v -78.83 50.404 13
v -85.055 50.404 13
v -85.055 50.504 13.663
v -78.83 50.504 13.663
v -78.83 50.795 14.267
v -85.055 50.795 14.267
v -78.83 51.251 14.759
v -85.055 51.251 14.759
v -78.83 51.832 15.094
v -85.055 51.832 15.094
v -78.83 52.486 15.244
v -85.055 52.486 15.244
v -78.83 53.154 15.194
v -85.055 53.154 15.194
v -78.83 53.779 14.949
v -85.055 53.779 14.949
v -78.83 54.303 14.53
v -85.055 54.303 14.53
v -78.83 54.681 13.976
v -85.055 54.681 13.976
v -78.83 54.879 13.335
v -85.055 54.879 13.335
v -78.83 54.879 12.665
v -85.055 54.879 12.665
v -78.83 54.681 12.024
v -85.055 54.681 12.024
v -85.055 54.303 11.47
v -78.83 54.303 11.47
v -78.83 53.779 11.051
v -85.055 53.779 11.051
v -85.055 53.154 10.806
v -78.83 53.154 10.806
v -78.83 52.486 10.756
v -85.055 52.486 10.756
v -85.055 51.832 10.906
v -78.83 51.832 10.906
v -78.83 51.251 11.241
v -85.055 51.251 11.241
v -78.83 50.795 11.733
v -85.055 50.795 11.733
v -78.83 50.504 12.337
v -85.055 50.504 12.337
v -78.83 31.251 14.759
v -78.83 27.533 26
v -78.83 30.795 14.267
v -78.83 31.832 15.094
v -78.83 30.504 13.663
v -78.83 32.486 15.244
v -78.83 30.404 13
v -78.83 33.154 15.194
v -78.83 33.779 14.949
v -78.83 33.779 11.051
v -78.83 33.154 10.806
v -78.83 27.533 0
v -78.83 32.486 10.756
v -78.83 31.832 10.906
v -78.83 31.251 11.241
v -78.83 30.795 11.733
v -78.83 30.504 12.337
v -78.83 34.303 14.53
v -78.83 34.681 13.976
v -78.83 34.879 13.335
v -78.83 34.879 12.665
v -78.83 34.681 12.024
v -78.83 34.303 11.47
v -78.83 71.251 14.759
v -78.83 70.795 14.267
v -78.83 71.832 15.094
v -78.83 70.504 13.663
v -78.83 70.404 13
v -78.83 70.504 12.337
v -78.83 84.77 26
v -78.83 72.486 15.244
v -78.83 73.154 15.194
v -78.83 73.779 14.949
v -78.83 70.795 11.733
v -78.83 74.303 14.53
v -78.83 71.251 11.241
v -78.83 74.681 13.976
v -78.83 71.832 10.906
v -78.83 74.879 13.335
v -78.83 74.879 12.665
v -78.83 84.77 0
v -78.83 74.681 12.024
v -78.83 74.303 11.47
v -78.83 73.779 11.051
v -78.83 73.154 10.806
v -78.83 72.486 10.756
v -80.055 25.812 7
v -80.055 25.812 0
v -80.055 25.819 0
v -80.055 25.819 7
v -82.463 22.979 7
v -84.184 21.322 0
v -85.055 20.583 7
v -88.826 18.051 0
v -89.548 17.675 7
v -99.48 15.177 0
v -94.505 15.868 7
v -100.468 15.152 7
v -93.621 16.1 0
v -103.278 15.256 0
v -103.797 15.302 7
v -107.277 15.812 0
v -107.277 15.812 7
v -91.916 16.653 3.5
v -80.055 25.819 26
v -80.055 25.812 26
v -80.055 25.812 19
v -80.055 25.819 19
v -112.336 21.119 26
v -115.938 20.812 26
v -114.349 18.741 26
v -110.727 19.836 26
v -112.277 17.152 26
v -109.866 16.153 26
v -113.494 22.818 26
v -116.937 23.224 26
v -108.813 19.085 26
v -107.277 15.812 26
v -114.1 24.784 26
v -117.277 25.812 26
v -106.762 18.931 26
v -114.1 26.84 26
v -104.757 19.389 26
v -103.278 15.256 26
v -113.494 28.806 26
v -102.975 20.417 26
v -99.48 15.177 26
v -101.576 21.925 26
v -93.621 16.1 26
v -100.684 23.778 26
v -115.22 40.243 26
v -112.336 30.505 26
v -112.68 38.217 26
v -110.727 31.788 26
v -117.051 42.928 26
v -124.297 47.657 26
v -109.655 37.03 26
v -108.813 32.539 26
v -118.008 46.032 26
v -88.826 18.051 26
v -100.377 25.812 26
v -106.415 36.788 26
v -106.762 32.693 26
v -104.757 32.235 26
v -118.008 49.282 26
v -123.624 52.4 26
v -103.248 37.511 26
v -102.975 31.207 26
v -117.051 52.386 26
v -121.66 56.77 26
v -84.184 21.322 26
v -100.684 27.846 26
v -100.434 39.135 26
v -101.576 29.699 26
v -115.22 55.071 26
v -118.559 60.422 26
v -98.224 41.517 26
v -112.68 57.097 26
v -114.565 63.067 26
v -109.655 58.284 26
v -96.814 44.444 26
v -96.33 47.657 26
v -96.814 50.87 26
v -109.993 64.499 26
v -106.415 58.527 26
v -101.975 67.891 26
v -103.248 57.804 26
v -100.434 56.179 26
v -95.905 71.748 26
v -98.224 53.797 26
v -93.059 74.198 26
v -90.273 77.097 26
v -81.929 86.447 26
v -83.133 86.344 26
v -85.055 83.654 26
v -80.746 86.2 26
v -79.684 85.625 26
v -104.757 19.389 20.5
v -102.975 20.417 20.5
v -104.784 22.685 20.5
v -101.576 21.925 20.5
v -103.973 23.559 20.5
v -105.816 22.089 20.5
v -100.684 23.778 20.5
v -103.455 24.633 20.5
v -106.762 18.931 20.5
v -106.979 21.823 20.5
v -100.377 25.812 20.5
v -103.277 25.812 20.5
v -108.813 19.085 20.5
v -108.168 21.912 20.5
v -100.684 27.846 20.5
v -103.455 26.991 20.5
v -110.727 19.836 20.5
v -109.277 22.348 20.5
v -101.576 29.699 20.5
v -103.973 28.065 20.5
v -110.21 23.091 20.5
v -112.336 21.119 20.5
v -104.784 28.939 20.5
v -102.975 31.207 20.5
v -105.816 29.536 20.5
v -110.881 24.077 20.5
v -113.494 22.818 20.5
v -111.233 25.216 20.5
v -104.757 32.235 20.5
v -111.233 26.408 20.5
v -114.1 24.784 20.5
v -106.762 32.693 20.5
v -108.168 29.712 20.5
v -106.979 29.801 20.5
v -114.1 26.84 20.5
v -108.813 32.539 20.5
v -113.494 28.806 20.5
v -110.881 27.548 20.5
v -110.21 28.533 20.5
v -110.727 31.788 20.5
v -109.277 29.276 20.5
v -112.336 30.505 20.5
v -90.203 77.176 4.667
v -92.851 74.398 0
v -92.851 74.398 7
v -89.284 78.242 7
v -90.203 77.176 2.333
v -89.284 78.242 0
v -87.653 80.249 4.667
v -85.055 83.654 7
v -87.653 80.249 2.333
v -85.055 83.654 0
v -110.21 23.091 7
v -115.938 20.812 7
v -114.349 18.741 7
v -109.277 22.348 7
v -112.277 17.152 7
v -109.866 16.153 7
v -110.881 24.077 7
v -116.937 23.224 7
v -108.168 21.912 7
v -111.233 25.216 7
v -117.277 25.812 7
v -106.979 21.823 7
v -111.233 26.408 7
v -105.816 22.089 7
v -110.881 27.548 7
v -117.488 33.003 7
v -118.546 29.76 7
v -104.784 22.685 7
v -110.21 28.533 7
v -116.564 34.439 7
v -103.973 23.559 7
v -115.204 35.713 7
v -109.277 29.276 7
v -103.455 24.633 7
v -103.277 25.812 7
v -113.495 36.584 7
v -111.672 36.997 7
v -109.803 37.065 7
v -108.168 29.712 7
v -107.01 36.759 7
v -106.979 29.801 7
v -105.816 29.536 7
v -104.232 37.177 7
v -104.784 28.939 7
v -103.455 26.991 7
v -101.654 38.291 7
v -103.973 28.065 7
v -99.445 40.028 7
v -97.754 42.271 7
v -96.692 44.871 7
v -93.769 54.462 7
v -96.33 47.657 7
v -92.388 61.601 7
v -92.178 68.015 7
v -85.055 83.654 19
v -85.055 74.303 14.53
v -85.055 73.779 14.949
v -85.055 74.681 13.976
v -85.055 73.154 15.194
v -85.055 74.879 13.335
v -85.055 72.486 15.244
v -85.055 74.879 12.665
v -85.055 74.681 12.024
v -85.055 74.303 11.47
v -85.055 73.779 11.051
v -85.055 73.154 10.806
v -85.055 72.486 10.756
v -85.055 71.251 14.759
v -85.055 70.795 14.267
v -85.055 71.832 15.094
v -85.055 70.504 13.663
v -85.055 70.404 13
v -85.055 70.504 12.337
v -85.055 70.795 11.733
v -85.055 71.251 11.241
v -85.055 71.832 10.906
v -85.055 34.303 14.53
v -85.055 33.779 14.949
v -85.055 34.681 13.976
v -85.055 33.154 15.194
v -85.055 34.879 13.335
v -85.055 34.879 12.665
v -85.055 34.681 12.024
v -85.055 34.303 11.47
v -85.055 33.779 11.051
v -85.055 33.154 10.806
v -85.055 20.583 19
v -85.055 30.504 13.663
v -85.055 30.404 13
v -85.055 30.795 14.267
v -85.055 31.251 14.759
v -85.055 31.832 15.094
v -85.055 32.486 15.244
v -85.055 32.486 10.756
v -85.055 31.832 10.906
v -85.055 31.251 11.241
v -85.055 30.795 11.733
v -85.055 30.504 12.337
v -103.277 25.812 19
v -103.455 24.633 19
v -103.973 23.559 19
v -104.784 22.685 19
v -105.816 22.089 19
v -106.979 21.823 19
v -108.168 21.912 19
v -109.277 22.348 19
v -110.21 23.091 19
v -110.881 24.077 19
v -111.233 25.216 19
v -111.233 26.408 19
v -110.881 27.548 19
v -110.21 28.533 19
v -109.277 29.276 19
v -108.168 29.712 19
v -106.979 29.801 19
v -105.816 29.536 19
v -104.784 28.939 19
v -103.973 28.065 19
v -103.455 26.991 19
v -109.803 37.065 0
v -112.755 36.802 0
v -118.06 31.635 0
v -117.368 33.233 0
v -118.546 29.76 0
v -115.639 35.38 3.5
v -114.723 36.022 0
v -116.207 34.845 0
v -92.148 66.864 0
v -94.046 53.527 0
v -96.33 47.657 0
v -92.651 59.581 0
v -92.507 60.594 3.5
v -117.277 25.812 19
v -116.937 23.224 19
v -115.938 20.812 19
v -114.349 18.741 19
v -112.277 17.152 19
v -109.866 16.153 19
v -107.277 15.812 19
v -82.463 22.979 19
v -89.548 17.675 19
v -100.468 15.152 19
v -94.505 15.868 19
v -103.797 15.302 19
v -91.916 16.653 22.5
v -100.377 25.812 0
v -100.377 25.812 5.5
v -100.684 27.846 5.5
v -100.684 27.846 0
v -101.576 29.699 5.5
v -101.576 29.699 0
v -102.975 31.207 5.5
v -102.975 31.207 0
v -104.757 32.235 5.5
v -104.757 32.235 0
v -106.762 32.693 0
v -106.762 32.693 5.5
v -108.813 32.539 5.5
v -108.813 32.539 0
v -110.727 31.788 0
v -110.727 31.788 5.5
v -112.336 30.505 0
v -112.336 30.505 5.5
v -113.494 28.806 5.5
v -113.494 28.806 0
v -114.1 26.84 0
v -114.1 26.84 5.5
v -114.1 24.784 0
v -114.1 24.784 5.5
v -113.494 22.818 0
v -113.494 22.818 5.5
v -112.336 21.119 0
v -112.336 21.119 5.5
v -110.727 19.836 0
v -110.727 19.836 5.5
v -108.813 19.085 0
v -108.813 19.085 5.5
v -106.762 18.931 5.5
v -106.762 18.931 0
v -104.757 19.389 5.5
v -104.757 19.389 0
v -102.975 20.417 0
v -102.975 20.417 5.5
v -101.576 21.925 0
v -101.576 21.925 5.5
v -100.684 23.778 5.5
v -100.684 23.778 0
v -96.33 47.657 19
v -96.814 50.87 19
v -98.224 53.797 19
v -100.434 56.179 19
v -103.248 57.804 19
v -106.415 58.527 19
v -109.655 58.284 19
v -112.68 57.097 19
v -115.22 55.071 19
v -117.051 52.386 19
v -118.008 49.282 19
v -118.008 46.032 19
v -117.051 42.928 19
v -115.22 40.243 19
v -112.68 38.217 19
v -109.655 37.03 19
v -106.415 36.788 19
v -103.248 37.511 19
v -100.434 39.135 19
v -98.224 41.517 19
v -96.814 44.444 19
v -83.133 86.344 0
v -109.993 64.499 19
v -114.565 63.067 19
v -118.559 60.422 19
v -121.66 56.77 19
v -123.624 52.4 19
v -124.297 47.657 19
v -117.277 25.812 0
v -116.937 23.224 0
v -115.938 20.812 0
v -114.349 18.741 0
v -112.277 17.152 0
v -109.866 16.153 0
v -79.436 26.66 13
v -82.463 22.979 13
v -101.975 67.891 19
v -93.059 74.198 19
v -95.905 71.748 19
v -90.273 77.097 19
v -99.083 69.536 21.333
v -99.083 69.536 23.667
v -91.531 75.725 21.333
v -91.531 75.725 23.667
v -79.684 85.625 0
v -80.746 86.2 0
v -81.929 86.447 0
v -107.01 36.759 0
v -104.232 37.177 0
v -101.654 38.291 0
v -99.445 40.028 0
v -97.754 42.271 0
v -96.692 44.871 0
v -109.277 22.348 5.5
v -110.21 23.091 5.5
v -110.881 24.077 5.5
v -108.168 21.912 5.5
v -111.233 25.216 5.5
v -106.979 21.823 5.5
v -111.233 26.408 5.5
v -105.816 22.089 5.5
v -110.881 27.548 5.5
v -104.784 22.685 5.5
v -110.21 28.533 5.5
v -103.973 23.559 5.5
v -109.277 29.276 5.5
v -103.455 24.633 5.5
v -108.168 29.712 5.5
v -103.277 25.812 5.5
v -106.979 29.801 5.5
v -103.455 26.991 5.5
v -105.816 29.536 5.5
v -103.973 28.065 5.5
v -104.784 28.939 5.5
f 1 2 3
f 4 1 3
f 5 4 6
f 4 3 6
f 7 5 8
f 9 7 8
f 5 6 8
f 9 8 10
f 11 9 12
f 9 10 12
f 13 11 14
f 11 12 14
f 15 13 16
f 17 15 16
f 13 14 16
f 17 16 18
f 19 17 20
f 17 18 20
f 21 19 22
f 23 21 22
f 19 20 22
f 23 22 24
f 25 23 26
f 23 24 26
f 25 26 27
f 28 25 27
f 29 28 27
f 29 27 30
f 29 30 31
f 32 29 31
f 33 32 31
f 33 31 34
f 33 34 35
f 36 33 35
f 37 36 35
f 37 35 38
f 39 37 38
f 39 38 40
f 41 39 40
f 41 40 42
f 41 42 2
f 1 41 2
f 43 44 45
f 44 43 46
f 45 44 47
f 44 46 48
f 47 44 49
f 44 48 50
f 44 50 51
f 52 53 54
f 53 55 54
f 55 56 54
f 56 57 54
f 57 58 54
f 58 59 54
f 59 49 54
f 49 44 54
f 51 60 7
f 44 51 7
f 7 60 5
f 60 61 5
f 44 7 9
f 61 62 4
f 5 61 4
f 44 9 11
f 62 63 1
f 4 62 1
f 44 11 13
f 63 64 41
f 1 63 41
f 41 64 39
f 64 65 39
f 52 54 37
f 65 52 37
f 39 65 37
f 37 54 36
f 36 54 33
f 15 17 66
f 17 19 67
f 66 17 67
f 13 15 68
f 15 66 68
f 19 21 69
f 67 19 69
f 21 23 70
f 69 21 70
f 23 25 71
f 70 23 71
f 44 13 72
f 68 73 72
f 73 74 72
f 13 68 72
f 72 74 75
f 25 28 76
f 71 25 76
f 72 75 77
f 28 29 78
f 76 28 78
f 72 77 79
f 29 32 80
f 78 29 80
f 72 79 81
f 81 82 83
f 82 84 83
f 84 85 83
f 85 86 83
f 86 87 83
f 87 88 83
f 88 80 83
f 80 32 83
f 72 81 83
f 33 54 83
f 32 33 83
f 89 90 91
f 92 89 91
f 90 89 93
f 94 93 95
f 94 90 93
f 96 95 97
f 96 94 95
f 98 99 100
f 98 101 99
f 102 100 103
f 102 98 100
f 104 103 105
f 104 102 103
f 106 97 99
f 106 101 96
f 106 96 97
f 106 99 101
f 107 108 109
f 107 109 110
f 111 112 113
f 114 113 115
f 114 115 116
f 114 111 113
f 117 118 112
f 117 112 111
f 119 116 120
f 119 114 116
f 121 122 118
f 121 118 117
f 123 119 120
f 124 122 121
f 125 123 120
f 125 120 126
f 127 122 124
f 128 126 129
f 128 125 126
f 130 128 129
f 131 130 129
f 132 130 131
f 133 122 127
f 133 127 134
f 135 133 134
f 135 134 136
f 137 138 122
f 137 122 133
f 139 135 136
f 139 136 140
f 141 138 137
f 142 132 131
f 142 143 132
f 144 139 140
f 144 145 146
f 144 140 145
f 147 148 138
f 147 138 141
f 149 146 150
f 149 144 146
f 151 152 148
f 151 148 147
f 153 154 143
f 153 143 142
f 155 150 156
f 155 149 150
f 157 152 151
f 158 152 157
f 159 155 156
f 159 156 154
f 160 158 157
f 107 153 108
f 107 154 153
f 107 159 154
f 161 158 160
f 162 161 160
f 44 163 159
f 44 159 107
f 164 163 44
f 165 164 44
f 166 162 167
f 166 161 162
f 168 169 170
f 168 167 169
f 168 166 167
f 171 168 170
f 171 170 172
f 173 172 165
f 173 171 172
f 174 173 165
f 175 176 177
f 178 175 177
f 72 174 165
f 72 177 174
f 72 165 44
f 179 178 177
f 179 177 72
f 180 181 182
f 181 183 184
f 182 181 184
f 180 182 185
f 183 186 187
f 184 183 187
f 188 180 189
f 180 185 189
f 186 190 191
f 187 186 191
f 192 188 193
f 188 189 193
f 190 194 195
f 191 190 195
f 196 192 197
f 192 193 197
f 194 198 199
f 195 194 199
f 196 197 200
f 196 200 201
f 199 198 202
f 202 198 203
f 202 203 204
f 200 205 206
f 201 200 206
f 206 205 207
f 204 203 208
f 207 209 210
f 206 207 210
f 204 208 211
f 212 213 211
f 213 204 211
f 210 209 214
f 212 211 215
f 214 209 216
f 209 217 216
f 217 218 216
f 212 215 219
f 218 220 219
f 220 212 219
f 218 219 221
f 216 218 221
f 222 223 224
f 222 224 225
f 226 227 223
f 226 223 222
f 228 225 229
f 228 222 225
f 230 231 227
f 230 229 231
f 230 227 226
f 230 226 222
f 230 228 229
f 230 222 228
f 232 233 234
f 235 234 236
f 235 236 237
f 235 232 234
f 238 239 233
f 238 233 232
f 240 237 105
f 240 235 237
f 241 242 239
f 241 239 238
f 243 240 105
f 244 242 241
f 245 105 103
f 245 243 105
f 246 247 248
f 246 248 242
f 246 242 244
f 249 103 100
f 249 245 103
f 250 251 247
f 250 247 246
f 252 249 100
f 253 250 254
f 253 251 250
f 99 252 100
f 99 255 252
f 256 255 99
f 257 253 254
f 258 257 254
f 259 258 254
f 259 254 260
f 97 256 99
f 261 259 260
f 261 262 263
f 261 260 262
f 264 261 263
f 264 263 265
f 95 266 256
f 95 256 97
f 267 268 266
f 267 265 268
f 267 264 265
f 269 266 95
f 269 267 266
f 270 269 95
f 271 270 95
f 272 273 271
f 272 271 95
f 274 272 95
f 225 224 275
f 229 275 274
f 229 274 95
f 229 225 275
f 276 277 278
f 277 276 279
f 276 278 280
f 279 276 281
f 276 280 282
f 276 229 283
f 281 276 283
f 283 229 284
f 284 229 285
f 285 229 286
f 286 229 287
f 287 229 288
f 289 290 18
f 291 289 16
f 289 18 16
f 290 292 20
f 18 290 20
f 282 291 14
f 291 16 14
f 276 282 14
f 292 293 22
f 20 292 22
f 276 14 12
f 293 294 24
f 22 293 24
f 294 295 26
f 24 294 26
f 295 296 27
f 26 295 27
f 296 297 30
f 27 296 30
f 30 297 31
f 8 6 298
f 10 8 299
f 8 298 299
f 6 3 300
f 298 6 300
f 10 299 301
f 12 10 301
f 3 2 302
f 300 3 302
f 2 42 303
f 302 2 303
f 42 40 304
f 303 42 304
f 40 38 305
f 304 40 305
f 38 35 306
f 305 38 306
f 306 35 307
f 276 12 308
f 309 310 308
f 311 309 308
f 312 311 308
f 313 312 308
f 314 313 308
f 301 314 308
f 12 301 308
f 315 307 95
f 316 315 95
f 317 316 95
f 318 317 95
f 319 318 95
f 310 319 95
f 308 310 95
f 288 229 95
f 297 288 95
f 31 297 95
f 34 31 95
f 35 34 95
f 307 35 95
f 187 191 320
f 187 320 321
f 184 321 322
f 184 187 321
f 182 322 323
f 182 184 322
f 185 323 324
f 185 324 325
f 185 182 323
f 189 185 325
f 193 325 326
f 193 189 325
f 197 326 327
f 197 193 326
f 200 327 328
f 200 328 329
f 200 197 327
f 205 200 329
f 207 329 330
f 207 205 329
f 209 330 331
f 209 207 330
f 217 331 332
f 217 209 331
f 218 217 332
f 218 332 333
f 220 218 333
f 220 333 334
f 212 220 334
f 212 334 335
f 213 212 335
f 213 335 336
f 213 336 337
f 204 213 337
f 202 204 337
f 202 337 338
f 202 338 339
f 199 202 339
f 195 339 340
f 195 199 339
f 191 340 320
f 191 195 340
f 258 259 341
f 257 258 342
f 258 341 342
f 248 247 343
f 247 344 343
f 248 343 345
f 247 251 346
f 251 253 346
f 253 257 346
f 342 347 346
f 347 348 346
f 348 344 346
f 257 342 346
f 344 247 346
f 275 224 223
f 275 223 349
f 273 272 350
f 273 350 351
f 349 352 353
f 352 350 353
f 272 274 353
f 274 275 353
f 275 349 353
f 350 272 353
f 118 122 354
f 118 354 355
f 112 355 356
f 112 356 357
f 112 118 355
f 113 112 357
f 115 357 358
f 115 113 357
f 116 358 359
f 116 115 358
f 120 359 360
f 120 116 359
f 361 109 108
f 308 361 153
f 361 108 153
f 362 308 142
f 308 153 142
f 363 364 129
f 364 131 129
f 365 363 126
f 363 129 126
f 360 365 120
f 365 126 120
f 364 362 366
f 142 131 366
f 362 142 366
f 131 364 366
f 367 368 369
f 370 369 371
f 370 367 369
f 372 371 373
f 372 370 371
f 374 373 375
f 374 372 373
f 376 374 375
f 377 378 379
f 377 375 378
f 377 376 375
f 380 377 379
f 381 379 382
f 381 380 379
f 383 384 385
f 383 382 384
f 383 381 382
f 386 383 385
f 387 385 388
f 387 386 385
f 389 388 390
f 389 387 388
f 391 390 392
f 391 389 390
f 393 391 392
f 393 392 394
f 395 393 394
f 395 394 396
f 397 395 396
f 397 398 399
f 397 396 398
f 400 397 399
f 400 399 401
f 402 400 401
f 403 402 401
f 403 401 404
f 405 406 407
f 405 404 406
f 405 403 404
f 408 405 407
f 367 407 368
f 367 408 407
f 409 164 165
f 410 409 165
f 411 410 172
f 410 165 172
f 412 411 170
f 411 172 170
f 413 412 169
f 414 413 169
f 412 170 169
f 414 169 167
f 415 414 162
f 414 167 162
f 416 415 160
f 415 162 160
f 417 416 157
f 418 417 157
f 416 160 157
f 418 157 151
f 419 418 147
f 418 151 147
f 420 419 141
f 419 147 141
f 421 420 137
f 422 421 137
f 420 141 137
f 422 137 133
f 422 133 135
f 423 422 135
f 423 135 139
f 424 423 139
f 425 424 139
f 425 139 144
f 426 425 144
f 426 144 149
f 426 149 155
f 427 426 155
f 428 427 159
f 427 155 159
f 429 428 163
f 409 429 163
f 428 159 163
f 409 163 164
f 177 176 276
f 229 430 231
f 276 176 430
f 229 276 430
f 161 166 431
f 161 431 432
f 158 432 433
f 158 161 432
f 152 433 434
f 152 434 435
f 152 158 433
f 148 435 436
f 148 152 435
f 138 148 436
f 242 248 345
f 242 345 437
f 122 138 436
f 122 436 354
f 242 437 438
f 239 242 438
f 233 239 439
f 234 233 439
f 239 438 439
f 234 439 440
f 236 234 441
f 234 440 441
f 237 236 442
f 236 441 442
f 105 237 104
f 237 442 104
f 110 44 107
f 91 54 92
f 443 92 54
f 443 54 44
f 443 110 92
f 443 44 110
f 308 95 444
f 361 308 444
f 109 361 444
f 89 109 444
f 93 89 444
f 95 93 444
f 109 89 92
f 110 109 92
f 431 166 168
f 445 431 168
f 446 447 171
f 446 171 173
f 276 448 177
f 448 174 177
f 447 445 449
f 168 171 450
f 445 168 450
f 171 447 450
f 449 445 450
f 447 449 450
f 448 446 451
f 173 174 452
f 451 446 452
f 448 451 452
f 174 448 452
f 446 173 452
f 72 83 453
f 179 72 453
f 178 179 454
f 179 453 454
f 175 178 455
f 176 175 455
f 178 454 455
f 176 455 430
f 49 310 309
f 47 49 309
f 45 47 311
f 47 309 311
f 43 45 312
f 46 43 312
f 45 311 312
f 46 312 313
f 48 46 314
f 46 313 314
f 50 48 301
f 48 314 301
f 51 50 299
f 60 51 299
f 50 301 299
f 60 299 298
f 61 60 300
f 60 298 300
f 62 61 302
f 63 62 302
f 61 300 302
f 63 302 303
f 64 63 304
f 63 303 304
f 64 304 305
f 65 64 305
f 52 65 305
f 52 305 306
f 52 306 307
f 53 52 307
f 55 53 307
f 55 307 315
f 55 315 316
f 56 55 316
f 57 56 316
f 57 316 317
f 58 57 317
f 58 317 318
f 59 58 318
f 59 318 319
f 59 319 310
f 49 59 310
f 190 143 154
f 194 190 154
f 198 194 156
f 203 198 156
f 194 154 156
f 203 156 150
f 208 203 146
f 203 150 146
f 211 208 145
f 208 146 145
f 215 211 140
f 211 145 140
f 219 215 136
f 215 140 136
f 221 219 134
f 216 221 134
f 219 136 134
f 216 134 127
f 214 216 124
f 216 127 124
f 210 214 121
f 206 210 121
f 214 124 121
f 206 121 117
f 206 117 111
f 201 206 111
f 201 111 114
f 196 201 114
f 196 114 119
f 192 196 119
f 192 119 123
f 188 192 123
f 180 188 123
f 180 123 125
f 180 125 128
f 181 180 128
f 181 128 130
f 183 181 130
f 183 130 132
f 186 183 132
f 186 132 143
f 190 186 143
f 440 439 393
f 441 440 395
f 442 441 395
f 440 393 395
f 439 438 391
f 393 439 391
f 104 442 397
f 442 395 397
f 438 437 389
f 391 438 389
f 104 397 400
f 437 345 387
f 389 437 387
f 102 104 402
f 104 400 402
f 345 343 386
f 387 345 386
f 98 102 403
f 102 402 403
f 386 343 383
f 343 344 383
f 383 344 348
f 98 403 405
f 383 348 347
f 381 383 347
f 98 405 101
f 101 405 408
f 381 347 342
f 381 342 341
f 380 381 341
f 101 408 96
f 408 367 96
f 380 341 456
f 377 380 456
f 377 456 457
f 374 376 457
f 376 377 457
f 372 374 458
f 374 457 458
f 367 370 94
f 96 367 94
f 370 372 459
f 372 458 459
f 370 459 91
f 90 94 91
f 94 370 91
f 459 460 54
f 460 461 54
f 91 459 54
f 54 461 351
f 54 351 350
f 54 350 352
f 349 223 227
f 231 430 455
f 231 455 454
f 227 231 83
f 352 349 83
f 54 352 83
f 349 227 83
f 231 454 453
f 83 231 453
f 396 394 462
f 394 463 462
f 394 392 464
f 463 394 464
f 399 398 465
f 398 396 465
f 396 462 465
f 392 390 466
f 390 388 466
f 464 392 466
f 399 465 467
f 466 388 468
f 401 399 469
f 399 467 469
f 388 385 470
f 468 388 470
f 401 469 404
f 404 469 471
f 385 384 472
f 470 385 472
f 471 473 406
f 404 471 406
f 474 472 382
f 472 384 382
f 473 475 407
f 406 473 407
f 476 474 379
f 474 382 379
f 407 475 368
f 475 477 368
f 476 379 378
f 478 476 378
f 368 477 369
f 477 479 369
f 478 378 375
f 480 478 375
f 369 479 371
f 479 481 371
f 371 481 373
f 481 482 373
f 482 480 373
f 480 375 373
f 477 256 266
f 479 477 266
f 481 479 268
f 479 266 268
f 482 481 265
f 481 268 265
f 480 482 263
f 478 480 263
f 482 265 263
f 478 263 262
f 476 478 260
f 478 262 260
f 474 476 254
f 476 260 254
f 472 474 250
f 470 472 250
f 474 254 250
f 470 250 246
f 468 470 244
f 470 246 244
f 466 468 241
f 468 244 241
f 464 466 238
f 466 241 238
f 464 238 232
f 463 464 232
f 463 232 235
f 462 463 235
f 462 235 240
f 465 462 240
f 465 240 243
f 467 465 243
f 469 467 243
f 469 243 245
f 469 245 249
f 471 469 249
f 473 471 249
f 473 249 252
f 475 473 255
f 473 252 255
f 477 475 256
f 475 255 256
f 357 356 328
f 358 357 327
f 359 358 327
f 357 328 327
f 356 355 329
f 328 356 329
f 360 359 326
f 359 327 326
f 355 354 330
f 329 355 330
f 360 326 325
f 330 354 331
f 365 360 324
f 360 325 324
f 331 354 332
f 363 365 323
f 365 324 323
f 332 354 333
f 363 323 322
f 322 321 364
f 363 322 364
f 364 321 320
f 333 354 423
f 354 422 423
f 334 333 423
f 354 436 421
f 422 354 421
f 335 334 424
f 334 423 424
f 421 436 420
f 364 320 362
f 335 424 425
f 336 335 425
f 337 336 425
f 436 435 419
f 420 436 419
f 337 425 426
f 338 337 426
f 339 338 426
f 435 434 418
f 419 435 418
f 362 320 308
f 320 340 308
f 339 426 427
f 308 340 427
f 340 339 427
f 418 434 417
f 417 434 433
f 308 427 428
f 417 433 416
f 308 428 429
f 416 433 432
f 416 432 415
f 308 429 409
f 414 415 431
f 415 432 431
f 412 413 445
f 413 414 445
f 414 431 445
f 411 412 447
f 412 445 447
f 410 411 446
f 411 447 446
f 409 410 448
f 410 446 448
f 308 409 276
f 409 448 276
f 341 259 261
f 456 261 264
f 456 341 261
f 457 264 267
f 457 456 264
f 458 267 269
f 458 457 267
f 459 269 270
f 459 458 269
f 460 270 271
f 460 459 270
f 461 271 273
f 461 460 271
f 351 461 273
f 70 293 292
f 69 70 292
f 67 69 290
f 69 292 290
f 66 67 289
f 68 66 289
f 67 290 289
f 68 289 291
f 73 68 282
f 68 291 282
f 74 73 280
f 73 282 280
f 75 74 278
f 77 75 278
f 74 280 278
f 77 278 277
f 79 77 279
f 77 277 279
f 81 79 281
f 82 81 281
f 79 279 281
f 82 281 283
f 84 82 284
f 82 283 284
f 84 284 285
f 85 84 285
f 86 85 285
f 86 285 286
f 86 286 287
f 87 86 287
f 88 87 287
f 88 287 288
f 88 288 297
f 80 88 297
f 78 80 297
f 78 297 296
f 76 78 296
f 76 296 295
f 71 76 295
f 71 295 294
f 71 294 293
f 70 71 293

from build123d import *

# Parameters (mm, degrees)
SKETCH1_R           = 6.9
SKETCH1_R_2         = 10.9
BOSS_EXTRUDE1_DEPTH = 7
BOSS_EXTRUDE2_DEPTH = 12
CUT_EXTRUDE1_DEPTH  = 13
BOSS_EXTRUDE3_DEPTH = 26
SKETCH5_R           = 7.973914392
SKETCH5_R_2         = 4
BOSS_EXTRUDE4_DEPTH = 1.5
BOSS_EXTRUDE5_START = -1.5
SKETCH6_R           = 8.491099949
SKETCH6_R_2         = 4
BOSS_EXTRUDE5_DEPTH = 1.5
SKETCH7_R           = 2.25
CUT_EXTRUDE2_DEPTH  = 99.438905233


with BuildPart() as part:
    # Sketch1 → Boss-Extrude1 (new body)
    with BuildSketch(Plane.XY):
        with BuildLine():
            ThreePointArc((-109.99286225, 64.498694041), (-120.238224228, 58.705152002), (-124.296770504, 47.657040238))
            Line((-124.296770504, 47.657040238), (-117.277493754, 25.812066819))
            ThreePointArc((-117.277493754, 25.812066819), (-114.348561566, 18.740999007), (-107.277493754, 15.812066819))
            add(Edge.make_bspline(
                [(-80.055270229, 25.812066819), (-90.16574855, 12.494826539), (-107.277493754, 15.812066819)],
                knots=[0, 0, 0, 1, 1, 1], degree=2))
            Line((-80.055270229, 25.812066819), (-80.055270229, 84.34418562))
            ThreePointArc((-80.055270229, 84.34418562), (-81.43033647, 86.24404293), (-83.664728026, 85.531470589))
            add(Edge.make_bspline(
                [(-109.99286225, 64.498694041), (-95.736844246, 69.471166394), (-91.130917767, 75.410465429), (-83.664728026, 85.531470589)],
                knots=[0, 0, 0, 0, 0.858728352, 0.858728352, 0.858728352, 0.858728352], degree=3))
        make_face()
        with Locations((-107.277493754, 25.812066819)):
            Circle(SKETCH1_R, mode=Mode.SUBTRACT)
        with Locations((-107.22999807, 47.657040238)):
            Circle(SKETCH1_R_2, mode=Mode.SUBTRACT)
    boss_extrude1 = extrude(amount=BOSS_EXTRUDE1_DEPTH)

    # Sketch2 → Boss-Extrude2 (add)
    with BuildSketch(Plane.XY.offset(7)):
        with BuildLine():
            Line((-85.055270217, 83.653678118), (-85.055270217, 20.583275514))
            add(Edge.make_bspline(
                [(-85.055270217, 20.583275514), (-82.371539661, 22.76114127), (-80.055270217, 25.812066834)],
                knots=[0, 0, 0, 1, 1, 1], degree=2))
            Line((-80.055270217, 25.812066834), (-80.055270229, 84.34418562))
            ThreePointArc((-80.055270229, 84.34418562), (-81.43033647, 86.24404293), (-83.664728026, 85.531470589))
            add(Edge.make_bspline(
                [(-83.664728026, 85.531470589), (-84.138702239, 84.888961408), (-84.601149423, 84.263304749), (-85.055270217, 83.653678118)],
                knots=[0, 0, 0, 0, 0.054514432, 0.054514432, 0.054514432, 0.054514432], degree=3))
        make_face()
    extrude(amount=BOSS_EXTRUDE2_DEPTH)

    # Mirror1: Boss-Extrude1 across plane
    add(boss_extrude1.mirror(Plane.XY.offset(13)))

    # Sketch3 → Cut-Extrude1 (cut)
    with BuildSketch(Plane(origin=(0, 0, 0), x_dir=(-1, 0, 0), z_dir=(0, 0, -1))):
        with BuildLine():
            Line((92.850529653, 74.397721592), (144.531216933, 88.865819457))
            Line((144.531216933, 88.865819457), (118.546118501, 29.760204905))
            add(Edge.make_bspline(
                [(107.22999807, 36.757040238), (116.864311021, 38.600442381), (118.546118501, 29.760204905)],
                knots=[0, 0, 0, 1, 1, 1], degree=2))
            ThreePointArc((107.22999807, 36.757040238), (99.522534155, 39.949576323), (96.32999807, 47.657040238))
            add(Edge.make_bspline(
                [(92.850529653, 74.397721592), (90.423550402, 60.160750292), (96.32999807, 47.657040238)],
                knots=[0, 0, 0, 1, 1, 1], degree=2))
        make_face()
    extrude(amount=-CUT_EXTRUDE1_DEPTH, mode=Mode.SUBTRACT)

    # Sketch4 → Boss-Extrude3 (add)
    with BuildSketch(Plane(origin=(0, 0, 0), x_dir=(-1, 0, 0), z_dir=(0, 0, -1))):
        with BuildLine():
            Line((83.132797407, 86.34418562), (85.055270217, 83.653678118))
            Line((85.055270217, 83.653678118), (85.055270214, 20.587782524))
            add(Edge.make_bspline(
                [(78.82999807, 27.533016311), (81.645897876, 23.355716893), (85.055270214, 20.587782524)],
                knots=[0, 0, 0, 1, 1, 1], degree=2))
            Line((78.82999807, 27.533016311), (78.82999807, 84.770259389))
            ThreePointArc((78.82999807, 84.770259389), (80.746261593, 86.200037671), (83.132797407, 86.34418562))
        make_face()
    extrude(amount=-BOSS_EXTRUDE3_DEPTH)

    # Sketch5 → Boss-Extrude4 (add)
    with BuildSketch(Plane.XY.offset(7)):
        with Locations((-107.277493754, 25.812066819)):
            Circle(SKETCH5_R)
        with Locations((-107.277493754, 25.812066819)):
            Circle(SKETCH5_R_2, mode=Mode.SUBTRACT)
    extrude(amount=-BOSS_EXTRUDE4_DEPTH)

    # Sketch6 → Boss-Extrude5 (add)
    with BuildSketch(Plane(origin=(0, 0, 19), x_dir=(-1, 0, 0), z_dir=(0, 0, -1)).offset(BOSS_EXTRUDE5_START)):
        with Locations((107.277493754, 25.812066819)):
            Circle(SKETCH6_R)
        with Locations(Location((107.277493754, 25.812066819, 0), (0, 0, 180))):
            Circle(SKETCH6_R_2, mode=Mode.SUBTRACT)
    extrude(amount=BOSS_EXTRUDE5_DEPTH)

    # Sketch7 → Cut-Extrude2 (cut, through all)
    with BuildSketch(Plane.ZY.offset(85.055270217)):
        with Locations(Location((13, 32.653678118, 0), (0, 0, 270))):
            Circle(SKETCH7_R)
        with Locations(Location((13, 52.653678118, 0), (0, 0, 270))):
            Circle(SKETCH7_R)
        with Locations(Location((13, 72.653678118, 0), (0, 0, 270))):
            Circle(SKETCH7_R)
    extrude(amount=-CUT_EXTRUDE2_DEPTH, mode=Mode.SUBTRACT)


solid = part.part
